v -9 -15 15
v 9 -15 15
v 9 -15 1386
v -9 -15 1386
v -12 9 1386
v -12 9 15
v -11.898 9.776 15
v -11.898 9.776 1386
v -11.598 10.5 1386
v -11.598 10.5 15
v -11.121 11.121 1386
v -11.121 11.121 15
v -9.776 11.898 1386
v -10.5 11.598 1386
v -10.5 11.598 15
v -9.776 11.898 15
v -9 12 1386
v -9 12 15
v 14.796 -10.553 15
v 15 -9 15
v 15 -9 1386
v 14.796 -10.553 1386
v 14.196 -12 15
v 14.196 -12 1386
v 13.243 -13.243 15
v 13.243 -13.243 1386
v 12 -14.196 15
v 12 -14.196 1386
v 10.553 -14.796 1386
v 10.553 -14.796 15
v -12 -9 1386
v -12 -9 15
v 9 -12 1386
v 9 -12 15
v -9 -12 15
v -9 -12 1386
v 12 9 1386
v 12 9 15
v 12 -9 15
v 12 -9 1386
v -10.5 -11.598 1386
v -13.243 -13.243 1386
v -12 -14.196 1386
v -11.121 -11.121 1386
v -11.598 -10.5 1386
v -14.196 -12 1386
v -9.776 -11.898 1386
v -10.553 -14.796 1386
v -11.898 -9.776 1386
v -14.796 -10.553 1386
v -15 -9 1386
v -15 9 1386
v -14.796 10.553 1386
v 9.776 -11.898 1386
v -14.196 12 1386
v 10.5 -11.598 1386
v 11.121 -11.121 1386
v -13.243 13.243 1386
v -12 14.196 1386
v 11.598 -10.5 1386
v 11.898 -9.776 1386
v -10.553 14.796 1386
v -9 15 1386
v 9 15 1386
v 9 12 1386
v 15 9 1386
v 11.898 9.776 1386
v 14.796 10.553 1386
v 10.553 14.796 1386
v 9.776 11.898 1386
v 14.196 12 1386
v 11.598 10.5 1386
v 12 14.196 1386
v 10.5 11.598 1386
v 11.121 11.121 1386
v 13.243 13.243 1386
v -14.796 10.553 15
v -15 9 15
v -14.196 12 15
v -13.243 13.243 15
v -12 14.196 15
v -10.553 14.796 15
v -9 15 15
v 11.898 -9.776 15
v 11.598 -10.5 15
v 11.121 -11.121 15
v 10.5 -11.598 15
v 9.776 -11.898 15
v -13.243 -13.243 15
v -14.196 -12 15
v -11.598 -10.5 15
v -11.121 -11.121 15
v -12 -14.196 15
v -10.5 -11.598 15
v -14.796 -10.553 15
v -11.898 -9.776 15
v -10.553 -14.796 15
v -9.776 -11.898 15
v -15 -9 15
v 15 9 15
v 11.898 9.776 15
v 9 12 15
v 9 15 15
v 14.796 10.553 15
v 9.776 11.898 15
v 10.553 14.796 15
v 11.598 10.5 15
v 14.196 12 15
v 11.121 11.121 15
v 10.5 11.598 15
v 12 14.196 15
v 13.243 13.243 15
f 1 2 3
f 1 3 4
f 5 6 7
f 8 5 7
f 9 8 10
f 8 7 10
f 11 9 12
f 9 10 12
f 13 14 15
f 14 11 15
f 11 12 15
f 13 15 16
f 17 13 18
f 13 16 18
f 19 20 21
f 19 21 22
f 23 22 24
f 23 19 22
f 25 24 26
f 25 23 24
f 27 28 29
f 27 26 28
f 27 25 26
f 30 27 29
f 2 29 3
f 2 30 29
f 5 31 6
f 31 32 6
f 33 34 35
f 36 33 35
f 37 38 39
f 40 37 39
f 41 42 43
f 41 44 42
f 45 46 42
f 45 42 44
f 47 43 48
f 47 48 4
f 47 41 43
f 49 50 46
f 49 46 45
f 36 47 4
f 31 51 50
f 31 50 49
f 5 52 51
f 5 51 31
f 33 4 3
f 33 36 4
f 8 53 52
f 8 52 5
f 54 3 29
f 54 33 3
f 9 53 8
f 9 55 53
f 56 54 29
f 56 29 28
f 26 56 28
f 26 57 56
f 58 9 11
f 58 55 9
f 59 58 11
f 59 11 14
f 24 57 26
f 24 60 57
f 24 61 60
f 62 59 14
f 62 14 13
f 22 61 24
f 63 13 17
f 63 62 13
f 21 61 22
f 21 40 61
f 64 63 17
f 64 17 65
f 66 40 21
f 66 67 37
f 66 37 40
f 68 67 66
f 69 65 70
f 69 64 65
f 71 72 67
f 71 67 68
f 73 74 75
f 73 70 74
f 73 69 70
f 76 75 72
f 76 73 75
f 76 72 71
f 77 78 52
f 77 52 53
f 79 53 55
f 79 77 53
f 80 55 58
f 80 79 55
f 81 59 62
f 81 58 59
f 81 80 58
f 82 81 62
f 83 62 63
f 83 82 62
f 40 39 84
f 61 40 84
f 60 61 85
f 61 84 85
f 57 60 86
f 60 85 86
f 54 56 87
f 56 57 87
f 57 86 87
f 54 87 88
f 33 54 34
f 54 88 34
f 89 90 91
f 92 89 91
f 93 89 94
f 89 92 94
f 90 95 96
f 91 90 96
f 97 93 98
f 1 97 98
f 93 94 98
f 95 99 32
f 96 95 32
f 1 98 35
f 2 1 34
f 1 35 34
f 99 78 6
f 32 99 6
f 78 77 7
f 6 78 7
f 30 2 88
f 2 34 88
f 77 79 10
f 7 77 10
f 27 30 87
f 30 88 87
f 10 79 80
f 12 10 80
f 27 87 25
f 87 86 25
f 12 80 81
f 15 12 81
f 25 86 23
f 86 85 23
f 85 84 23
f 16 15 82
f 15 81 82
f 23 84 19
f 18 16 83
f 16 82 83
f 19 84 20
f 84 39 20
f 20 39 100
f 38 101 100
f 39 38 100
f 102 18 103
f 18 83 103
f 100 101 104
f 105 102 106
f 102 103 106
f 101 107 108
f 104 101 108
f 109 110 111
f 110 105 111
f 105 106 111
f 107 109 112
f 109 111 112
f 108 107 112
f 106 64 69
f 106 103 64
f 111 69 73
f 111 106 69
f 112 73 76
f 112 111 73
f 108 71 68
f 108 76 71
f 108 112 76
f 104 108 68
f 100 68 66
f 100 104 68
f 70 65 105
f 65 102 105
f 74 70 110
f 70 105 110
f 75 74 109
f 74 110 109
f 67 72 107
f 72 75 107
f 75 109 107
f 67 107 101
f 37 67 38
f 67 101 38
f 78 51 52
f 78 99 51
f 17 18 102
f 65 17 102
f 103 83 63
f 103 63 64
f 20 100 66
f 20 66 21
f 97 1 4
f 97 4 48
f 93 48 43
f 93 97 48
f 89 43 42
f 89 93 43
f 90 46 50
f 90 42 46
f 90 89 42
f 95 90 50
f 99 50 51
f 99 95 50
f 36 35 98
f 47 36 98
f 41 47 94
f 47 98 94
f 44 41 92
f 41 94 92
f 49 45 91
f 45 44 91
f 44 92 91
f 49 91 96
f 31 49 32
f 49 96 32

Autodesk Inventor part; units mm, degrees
ref_plane "Start Plane" through (0, 0, 15) normal (0, 0, 1) x (1, 0, 0)
ref_plane "End Plane" through (0, 0, 1386) normal (0, 0, 1) x (1, 0, 0)
sketch "Sketch" plane through (0, 0, 0) normal (0, 0, 1) x (1, 0, 0)
  line L0 (-15, -9) -> (-15, 9)
  line L1 (-9, 15) -> (9, 15)
  line L2 (15, 9) -> (15, -9)
  line L3 (9, -15) -> (-9, -15)
  arc A0 (-15, -9) -> (-9, -15) centre (-9, -9) ccw
  arc A1 (-9, 15) -> (-15, 9) centre (-9, 9) ccw
  arc A2 (15, 9) -> (9, 15) centre (9, 9) ccw
  arc A3 (9, -15) -> (15, -9) centre (9, -9) ccw
  arc A4 (-9, 12) -> (-12, 9) centre (-9, 9) ccw
  line L4 (-9, 12) -> (9, 12)
  arc A5 (12, 9) -> (9, 12) centre (9, 9) ccw
  line L5 (12, 9) -> (12, -9)
  arc A6 (9, -12) -> (12, -9) centre (9, -9) ccw
  line L6 (9, -12) -> (-9, -12)
  arc A7 (-12, -9) -> (-9, -12) centre (-9, -9) ccw
  line L7 (-12, -9) -> (-12, 9)
  line L8 (0, 22.7397) -> (0, -22.7397) construction
  line L9 (-22.7397, 0) -> (22.7397, 0) construction
  dimension "d7" = 6
  dimension "d10" = 30
  dimension "d11" = 30
  dimension "d12" = 3
  dimension "d15" = 15
  dimension "d16" = 15
extrude "Body" add sketch "Sketch" along normal up to surface (1371 mm away) from surface at 15
sketch "Sketch3" plane through (0, 0, 0) normal (0, 0, 1) x (1, 0, 0)
  line L0 (0, 0) -> (10, 0)
ref_plane "Work Plane3" through (0, 0, 0) normal (0, -1, 0) x (1, 0, 0)
ref_plane "Work Plane4" through (9, -520, 15) normal (0, 0, -1) x (-1, 0, 0)
split "Split1" plane through (9, -520, 15) removes the side toward (0, 0, -1)
ref_plane "Work Plane5" through (9, 230, 1386) normal (0, 0, 1) x (1, 0, 0)
split "Split2" plane through (9, 230, 1386) removes the side toward (0, 0, 1)
sketch "Sketch4" plane through (0, 0, 0) normal (0, -1, 0) x (1, 0, 0)
  line L0 (-2, 15) -> (12, 15) projected
  line L1 (-2, 1386) -> (12, 1386) projected
  dimension "d18" = 1371
equation "\"d7\" = G_IR"
equation "\"d10\" = G_H"
equation "\"d11\" = G_W"
equation "\"d12\" = G_T"
equation "\"d15\" = 0.5 * d10"
equation "\"d16\" = 0.5 * d11"
equation "\"d3\" = G_L"
equation "\"G_W\" = 30"
equation "\"G_H\" = 30"
equation "\"G_T\" = 3"
equation "\"G_IR\" = 6"
equation "\"G_L\" = d18"
equation "\"G_OFFSET_START\" = -15"
equation "\"G_OFFSET_END\" = -15"
equation "\"d13\" = -G_OFFSET_START"
equation "\"d14\" = G_OFFSET_END + B_L"
equation "\"B_L\" = 1401"
properties part number "DIN EN 10219-2 - 30 x 30 x 3  - 1371" material "Steel, Mild"
